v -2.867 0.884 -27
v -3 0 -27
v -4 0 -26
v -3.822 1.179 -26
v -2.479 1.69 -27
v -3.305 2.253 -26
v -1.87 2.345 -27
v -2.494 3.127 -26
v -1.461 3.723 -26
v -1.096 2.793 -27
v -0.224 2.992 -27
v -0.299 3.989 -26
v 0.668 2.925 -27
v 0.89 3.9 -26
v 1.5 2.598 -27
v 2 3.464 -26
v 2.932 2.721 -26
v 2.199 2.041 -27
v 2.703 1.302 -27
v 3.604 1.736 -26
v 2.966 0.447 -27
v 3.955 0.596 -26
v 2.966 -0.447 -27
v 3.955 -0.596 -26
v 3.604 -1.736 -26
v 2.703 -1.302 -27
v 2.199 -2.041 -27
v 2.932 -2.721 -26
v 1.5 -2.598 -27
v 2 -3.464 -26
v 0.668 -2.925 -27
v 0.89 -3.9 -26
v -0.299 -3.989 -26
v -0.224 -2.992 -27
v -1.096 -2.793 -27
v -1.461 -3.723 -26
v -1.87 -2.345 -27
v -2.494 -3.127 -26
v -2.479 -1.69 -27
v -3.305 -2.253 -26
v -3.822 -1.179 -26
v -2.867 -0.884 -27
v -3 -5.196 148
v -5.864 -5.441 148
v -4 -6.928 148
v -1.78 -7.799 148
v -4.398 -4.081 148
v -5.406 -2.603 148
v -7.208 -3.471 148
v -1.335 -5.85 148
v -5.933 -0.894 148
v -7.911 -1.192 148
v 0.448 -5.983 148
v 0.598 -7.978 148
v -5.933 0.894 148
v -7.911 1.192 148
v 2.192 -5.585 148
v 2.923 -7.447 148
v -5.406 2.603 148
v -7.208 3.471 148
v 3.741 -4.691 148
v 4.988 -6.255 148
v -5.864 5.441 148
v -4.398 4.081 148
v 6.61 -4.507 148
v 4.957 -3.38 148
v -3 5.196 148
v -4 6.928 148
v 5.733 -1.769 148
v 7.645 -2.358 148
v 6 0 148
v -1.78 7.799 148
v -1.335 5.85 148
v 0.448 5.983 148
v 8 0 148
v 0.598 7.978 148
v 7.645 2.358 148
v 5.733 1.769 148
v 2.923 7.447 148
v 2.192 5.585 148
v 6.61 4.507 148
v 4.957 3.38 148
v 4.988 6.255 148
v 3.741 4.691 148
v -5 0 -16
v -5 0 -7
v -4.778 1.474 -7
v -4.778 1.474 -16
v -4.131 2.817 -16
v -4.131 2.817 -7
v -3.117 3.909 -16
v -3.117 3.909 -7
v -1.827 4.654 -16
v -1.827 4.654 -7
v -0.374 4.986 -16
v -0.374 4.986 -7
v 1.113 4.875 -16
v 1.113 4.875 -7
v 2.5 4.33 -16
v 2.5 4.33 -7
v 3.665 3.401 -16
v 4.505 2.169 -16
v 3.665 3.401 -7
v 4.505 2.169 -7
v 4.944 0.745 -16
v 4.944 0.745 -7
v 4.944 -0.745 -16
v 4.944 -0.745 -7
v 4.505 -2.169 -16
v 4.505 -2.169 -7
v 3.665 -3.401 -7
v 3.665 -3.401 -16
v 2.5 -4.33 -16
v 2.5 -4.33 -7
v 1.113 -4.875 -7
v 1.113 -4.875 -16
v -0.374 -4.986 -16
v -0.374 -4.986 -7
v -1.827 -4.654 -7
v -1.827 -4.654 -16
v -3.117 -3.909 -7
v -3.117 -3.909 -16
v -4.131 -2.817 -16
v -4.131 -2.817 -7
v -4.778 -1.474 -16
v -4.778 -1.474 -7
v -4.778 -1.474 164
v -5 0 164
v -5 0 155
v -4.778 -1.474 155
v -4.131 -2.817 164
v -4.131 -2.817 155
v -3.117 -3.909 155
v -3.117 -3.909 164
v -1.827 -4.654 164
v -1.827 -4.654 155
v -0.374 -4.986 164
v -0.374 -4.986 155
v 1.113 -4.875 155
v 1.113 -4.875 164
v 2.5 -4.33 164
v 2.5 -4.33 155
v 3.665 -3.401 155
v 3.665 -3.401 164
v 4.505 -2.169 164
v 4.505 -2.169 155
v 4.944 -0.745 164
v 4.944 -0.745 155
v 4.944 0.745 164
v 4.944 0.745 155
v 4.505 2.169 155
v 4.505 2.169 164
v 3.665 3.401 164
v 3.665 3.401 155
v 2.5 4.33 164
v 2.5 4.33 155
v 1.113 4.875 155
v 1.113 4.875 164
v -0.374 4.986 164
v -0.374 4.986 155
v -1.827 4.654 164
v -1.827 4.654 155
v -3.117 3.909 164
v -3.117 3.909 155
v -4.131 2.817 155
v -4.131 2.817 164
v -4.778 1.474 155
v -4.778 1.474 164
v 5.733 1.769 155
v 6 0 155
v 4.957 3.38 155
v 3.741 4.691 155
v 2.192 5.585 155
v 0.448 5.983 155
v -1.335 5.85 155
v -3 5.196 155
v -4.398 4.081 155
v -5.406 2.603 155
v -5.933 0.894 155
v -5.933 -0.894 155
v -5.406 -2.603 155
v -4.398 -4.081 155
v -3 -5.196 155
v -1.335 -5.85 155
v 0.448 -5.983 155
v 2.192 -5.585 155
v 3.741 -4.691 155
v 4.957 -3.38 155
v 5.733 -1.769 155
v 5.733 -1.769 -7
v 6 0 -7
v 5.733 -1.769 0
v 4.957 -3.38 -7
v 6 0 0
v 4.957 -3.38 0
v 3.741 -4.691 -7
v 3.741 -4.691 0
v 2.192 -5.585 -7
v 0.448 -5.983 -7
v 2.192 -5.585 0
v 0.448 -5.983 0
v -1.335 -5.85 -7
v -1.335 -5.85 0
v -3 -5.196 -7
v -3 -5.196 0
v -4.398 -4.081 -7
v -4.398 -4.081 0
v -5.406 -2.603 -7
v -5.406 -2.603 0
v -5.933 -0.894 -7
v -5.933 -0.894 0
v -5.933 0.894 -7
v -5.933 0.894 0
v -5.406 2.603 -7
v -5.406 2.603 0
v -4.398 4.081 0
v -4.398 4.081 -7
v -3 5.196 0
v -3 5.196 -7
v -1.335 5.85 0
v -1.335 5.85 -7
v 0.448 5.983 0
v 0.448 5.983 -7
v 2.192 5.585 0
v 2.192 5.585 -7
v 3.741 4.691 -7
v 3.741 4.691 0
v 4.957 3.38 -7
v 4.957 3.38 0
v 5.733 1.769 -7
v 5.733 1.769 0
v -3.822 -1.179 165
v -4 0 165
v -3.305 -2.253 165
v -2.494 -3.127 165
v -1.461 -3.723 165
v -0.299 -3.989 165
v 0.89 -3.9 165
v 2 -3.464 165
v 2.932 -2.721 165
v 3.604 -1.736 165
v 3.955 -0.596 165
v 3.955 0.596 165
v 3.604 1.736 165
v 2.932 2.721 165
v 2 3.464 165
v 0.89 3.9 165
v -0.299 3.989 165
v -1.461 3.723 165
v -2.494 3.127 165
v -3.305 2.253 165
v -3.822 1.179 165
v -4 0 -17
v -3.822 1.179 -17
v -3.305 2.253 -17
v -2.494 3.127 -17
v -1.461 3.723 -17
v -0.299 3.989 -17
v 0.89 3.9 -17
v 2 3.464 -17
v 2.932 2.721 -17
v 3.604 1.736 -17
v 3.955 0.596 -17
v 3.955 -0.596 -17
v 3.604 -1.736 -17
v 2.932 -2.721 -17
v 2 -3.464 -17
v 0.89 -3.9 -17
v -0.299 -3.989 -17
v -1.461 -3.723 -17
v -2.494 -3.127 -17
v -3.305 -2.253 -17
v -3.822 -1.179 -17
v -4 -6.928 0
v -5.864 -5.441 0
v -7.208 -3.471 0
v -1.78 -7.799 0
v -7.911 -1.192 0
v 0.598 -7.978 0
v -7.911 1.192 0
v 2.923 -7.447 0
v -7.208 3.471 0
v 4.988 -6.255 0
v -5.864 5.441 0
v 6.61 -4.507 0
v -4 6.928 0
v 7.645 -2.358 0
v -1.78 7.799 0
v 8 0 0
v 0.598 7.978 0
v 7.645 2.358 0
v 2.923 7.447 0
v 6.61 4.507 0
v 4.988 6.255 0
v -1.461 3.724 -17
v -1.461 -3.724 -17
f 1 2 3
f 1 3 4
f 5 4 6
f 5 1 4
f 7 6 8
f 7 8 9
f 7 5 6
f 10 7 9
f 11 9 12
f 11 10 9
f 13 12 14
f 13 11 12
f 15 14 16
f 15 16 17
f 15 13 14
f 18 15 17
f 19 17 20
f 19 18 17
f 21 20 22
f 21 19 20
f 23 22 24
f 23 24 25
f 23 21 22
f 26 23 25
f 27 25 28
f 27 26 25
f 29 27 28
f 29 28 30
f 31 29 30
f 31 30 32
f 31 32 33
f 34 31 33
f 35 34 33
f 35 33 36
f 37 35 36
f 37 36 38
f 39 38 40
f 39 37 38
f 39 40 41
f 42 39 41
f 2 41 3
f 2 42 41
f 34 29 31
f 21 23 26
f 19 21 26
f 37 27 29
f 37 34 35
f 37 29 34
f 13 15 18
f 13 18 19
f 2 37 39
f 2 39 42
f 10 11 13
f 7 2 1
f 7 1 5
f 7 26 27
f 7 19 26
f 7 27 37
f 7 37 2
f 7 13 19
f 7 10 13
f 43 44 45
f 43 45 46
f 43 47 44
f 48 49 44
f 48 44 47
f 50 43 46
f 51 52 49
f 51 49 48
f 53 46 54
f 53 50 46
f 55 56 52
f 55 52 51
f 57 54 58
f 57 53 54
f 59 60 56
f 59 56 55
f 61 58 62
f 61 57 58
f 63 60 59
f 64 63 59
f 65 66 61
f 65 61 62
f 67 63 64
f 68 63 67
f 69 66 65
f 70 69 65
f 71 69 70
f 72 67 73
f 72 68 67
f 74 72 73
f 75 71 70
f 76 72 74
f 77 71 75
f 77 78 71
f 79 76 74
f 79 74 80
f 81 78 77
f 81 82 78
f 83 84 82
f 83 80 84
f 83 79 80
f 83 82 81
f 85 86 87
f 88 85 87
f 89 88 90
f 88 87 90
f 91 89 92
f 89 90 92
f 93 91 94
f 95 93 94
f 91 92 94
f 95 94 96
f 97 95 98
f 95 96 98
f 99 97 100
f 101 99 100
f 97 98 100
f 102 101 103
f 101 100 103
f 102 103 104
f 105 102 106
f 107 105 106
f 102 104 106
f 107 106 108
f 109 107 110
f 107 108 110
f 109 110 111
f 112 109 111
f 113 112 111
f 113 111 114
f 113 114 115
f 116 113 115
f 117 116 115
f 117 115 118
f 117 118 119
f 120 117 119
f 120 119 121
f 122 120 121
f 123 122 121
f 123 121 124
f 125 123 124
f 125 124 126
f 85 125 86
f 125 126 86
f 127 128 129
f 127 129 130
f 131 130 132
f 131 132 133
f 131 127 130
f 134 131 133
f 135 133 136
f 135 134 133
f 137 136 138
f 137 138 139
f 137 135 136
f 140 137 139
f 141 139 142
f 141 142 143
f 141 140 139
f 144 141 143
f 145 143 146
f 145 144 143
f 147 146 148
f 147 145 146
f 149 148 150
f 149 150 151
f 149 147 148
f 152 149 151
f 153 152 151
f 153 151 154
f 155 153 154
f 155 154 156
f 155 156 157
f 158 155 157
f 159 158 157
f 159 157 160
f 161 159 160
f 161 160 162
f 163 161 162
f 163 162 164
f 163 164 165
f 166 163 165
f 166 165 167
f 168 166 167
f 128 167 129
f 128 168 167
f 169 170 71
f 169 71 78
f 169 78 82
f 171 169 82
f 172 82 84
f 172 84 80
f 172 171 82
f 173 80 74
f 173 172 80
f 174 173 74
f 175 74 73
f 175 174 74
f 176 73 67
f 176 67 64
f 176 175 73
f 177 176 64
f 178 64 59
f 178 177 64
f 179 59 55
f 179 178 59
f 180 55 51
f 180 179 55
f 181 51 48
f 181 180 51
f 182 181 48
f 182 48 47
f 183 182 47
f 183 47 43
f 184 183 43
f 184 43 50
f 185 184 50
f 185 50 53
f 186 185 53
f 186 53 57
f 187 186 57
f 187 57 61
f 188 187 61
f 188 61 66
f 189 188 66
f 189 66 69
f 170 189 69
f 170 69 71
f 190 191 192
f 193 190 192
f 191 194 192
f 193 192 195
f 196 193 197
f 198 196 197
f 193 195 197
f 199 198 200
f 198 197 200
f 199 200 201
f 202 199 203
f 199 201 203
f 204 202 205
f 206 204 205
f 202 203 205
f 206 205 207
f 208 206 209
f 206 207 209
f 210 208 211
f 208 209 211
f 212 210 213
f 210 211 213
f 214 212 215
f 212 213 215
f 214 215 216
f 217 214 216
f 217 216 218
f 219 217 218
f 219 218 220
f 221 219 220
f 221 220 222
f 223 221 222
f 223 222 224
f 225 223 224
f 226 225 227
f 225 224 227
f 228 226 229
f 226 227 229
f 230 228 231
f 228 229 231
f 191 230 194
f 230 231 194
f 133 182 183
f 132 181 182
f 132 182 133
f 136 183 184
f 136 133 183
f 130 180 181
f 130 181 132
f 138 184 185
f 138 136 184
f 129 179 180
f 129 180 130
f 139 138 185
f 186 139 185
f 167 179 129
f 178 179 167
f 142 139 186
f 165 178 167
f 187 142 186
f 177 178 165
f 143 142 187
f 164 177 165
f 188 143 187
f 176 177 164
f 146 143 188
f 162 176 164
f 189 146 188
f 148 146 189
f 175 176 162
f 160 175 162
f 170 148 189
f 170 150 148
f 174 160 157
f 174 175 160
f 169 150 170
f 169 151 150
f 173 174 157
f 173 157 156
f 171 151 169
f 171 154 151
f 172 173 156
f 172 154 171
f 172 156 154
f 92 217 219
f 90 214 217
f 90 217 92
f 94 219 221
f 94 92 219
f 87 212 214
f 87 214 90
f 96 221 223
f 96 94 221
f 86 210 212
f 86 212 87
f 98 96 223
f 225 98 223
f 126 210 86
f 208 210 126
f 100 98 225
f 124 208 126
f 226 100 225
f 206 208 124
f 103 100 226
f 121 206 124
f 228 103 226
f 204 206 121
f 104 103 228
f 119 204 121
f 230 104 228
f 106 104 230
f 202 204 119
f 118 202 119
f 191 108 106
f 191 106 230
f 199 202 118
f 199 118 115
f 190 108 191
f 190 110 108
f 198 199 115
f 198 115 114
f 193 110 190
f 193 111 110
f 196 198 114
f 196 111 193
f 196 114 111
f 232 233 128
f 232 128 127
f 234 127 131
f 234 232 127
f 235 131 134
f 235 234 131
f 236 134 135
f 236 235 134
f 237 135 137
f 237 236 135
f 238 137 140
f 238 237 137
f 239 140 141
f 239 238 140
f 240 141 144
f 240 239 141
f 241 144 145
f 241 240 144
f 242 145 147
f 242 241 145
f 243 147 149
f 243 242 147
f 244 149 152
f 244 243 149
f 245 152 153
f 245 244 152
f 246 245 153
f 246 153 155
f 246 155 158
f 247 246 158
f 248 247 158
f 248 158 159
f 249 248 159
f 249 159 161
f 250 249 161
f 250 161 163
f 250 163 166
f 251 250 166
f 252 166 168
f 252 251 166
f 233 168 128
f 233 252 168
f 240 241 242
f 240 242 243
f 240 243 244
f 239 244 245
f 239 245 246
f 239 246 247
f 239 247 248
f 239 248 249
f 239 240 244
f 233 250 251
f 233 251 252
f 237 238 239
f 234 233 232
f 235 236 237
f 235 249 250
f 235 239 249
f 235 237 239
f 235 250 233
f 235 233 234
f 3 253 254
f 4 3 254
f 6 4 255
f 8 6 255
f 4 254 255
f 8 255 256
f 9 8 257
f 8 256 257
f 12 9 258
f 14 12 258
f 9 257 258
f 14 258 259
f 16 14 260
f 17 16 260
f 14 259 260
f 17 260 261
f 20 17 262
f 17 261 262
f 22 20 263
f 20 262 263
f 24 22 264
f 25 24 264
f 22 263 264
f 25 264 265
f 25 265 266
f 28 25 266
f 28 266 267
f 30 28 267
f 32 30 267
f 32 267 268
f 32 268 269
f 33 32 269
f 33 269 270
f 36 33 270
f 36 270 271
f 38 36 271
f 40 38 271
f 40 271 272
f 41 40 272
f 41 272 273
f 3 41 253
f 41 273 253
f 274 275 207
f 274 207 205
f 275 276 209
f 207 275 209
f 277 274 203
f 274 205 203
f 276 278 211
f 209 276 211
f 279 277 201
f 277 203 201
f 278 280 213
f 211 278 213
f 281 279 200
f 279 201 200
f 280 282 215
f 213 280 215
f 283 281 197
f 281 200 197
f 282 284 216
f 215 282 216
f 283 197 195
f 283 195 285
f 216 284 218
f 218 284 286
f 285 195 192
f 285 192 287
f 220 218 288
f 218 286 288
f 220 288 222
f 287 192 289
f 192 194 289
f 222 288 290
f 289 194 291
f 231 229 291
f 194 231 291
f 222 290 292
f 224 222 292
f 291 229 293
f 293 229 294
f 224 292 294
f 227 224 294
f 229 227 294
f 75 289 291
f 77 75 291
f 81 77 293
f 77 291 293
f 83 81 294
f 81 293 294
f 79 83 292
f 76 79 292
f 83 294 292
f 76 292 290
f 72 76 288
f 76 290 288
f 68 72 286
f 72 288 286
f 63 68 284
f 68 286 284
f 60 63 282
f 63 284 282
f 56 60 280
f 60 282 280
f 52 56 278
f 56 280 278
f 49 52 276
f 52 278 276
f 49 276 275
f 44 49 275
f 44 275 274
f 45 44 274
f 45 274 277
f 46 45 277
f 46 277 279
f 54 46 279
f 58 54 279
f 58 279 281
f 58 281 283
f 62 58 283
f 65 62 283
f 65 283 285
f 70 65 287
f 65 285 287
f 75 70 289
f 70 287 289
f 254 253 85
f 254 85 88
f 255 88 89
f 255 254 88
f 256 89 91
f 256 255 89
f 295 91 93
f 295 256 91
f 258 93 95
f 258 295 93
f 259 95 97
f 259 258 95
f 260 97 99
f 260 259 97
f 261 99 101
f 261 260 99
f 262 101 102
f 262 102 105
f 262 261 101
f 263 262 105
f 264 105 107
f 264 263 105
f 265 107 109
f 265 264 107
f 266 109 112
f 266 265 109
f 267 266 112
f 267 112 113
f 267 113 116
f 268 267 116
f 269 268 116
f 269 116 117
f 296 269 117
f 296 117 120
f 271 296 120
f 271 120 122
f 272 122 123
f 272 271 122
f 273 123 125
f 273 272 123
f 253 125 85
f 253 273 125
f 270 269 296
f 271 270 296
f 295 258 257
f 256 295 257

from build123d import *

# Parameters (mm, degrees)
SKETCH1_R           = 8
BOSS_EXTRUDE1_DEPTH = 148
SKETCH6_R           = 6
BOSS_EXTRUDE2_DEPTH = 5
SKETCH7_R           = 6
BOSS_EXTRUDE3_DEPTH = 2
SKETCH8_R           = 5
BOSS_EXTRUDE4_DEPTH = 10
SKETCH9_R           = 4
BOSS_EXTRUDE5_DEPTH = 10
CHAMFER1_SIZE       = 1
CHAMFER2_SIZE       = 1
BOSS_EXTRUDE6_START = 5
SKETCH10_R          = 6
BOSS_EXTRUDE6_DEPTH = 5
BOSS_EXTRUDE7_START = 2
SKETCH11_R          = 6
BOSS_EXTRUDE7_DEPTH = 2
BOSS_EXTRUDE8_START = 10
SKETCH12_R          = 5
BOSS_EXTRUDE8_DEPTH = 10
CHAMFER3_SIZE       = 1


with BuildPart() as part:
    # Sketch1 → Boss-Extrude1 (new body)
    with BuildSketch(Plane.XY):
        Circle(SKETCH1_R)
    extrude(amount=BOSS_EXTRUDE1_DEPTH)

    # Sketch6 → Boss-Extrude2 (add)
    with BuildSketch(Plane(origin=(0, 0, 0), x_dir=(-1, 0, 0), z_dir=(0, 0, -1))):
        with Locations(Location((0, 0, 0), (0, 0, 180))):
            Circle(SKETCH6_R)
    extrude(amount=BOSS_EXTRUDE2_DEPTH)

    # Sketch7 → Boss-Extrude3 (add)
    with BuildSketch(Plane(origin=(0, 0, -5), x_dir=(-1, 0, 0), z_dir=(0, 0, -1))):
        with Locations(Location((0, 0, 0), (0, 0, 180))):
            Circle(SKETCH7_R)
    extrude(amount=BOSS_EXTRUDE3_DEPTH)

    # Sketch8 → Boss-Extrude4 (add)
    with BuildSketch(Plane(origin=(0, 0, -7), x_dir=(-1, 0, 0), z_dir=(0, 0, -1))):
        Circle(SKETCH8_R)
    extrude(amount=BOSS_EXTRUDE4_DEPTH)

    # Sketch9 → Boss-Extrude5 (add)
    with BuildSketch(Plane(origin=(0, 0, -17), x_dir=(-1, 0, 0), z_dir=(0, 0, -1))):
        Circle(SKETCH9_R)
    extrude(amount=BOSS_EXTRUDE5_DEPTH)

    # Chamfer1
    chamfer1_edges = [part.edges().sort_by_distance(p)[0] for p in [
        (5, 0, -17),
    ]]
    chamfer(chamfer1_edges, length=CHAMFER1_SIZE - 0.0001)  # a hair under: the kernel refuses the full size

    # Chamfer2
    chamfer2_edges = [part.edges().sort_by_distance(p)[0] for p in [
        (4, 0, -27),
    ]]
    chamfer(chamfer2_edges, length=CHAMFER2_SIZE)

    # Sketch10 → Boss-Extrude6 (add)
    with BuildSketch(Plane.XY.offset(148).offset(BOSS_EXTRUDE6_START)):
        Circle(SKETCH10_R)
    extrude(amount=-BOSS_EXTRUDE6_DEPTH)

    # Sketch11 → Boss-Extrude7 (add)
    with BuildSketch(Plane.XY.offset(153).offset(BOSS_EXTRUDE7_START)):
        Circle(SKETCH11_R)
    extrude(amount=-BOSS_EXTRUDE7_DEPTH)

    # Sketch12 → Boss-Extrude8 (add)
    with BuildSketch(Plane.XY.offset(155).offset(BOSS_EXTRUDE8_START)):
        with Locations(Location((0, 0, 0), (0, 0, 180))):
            Circle(SKETCH12_R)
    extrude(amount=-BOSS_EXTRUDE8_DEPTH)

    # Chamfer3
    chamfer3_edges = [part.edges().sort_by_distance(p)[0] for p in [
        (5, 0, 165),
    ]]
    chamfer(chamfer3_edges, length=CHAMFER3_SIZE)


solid = part.part
